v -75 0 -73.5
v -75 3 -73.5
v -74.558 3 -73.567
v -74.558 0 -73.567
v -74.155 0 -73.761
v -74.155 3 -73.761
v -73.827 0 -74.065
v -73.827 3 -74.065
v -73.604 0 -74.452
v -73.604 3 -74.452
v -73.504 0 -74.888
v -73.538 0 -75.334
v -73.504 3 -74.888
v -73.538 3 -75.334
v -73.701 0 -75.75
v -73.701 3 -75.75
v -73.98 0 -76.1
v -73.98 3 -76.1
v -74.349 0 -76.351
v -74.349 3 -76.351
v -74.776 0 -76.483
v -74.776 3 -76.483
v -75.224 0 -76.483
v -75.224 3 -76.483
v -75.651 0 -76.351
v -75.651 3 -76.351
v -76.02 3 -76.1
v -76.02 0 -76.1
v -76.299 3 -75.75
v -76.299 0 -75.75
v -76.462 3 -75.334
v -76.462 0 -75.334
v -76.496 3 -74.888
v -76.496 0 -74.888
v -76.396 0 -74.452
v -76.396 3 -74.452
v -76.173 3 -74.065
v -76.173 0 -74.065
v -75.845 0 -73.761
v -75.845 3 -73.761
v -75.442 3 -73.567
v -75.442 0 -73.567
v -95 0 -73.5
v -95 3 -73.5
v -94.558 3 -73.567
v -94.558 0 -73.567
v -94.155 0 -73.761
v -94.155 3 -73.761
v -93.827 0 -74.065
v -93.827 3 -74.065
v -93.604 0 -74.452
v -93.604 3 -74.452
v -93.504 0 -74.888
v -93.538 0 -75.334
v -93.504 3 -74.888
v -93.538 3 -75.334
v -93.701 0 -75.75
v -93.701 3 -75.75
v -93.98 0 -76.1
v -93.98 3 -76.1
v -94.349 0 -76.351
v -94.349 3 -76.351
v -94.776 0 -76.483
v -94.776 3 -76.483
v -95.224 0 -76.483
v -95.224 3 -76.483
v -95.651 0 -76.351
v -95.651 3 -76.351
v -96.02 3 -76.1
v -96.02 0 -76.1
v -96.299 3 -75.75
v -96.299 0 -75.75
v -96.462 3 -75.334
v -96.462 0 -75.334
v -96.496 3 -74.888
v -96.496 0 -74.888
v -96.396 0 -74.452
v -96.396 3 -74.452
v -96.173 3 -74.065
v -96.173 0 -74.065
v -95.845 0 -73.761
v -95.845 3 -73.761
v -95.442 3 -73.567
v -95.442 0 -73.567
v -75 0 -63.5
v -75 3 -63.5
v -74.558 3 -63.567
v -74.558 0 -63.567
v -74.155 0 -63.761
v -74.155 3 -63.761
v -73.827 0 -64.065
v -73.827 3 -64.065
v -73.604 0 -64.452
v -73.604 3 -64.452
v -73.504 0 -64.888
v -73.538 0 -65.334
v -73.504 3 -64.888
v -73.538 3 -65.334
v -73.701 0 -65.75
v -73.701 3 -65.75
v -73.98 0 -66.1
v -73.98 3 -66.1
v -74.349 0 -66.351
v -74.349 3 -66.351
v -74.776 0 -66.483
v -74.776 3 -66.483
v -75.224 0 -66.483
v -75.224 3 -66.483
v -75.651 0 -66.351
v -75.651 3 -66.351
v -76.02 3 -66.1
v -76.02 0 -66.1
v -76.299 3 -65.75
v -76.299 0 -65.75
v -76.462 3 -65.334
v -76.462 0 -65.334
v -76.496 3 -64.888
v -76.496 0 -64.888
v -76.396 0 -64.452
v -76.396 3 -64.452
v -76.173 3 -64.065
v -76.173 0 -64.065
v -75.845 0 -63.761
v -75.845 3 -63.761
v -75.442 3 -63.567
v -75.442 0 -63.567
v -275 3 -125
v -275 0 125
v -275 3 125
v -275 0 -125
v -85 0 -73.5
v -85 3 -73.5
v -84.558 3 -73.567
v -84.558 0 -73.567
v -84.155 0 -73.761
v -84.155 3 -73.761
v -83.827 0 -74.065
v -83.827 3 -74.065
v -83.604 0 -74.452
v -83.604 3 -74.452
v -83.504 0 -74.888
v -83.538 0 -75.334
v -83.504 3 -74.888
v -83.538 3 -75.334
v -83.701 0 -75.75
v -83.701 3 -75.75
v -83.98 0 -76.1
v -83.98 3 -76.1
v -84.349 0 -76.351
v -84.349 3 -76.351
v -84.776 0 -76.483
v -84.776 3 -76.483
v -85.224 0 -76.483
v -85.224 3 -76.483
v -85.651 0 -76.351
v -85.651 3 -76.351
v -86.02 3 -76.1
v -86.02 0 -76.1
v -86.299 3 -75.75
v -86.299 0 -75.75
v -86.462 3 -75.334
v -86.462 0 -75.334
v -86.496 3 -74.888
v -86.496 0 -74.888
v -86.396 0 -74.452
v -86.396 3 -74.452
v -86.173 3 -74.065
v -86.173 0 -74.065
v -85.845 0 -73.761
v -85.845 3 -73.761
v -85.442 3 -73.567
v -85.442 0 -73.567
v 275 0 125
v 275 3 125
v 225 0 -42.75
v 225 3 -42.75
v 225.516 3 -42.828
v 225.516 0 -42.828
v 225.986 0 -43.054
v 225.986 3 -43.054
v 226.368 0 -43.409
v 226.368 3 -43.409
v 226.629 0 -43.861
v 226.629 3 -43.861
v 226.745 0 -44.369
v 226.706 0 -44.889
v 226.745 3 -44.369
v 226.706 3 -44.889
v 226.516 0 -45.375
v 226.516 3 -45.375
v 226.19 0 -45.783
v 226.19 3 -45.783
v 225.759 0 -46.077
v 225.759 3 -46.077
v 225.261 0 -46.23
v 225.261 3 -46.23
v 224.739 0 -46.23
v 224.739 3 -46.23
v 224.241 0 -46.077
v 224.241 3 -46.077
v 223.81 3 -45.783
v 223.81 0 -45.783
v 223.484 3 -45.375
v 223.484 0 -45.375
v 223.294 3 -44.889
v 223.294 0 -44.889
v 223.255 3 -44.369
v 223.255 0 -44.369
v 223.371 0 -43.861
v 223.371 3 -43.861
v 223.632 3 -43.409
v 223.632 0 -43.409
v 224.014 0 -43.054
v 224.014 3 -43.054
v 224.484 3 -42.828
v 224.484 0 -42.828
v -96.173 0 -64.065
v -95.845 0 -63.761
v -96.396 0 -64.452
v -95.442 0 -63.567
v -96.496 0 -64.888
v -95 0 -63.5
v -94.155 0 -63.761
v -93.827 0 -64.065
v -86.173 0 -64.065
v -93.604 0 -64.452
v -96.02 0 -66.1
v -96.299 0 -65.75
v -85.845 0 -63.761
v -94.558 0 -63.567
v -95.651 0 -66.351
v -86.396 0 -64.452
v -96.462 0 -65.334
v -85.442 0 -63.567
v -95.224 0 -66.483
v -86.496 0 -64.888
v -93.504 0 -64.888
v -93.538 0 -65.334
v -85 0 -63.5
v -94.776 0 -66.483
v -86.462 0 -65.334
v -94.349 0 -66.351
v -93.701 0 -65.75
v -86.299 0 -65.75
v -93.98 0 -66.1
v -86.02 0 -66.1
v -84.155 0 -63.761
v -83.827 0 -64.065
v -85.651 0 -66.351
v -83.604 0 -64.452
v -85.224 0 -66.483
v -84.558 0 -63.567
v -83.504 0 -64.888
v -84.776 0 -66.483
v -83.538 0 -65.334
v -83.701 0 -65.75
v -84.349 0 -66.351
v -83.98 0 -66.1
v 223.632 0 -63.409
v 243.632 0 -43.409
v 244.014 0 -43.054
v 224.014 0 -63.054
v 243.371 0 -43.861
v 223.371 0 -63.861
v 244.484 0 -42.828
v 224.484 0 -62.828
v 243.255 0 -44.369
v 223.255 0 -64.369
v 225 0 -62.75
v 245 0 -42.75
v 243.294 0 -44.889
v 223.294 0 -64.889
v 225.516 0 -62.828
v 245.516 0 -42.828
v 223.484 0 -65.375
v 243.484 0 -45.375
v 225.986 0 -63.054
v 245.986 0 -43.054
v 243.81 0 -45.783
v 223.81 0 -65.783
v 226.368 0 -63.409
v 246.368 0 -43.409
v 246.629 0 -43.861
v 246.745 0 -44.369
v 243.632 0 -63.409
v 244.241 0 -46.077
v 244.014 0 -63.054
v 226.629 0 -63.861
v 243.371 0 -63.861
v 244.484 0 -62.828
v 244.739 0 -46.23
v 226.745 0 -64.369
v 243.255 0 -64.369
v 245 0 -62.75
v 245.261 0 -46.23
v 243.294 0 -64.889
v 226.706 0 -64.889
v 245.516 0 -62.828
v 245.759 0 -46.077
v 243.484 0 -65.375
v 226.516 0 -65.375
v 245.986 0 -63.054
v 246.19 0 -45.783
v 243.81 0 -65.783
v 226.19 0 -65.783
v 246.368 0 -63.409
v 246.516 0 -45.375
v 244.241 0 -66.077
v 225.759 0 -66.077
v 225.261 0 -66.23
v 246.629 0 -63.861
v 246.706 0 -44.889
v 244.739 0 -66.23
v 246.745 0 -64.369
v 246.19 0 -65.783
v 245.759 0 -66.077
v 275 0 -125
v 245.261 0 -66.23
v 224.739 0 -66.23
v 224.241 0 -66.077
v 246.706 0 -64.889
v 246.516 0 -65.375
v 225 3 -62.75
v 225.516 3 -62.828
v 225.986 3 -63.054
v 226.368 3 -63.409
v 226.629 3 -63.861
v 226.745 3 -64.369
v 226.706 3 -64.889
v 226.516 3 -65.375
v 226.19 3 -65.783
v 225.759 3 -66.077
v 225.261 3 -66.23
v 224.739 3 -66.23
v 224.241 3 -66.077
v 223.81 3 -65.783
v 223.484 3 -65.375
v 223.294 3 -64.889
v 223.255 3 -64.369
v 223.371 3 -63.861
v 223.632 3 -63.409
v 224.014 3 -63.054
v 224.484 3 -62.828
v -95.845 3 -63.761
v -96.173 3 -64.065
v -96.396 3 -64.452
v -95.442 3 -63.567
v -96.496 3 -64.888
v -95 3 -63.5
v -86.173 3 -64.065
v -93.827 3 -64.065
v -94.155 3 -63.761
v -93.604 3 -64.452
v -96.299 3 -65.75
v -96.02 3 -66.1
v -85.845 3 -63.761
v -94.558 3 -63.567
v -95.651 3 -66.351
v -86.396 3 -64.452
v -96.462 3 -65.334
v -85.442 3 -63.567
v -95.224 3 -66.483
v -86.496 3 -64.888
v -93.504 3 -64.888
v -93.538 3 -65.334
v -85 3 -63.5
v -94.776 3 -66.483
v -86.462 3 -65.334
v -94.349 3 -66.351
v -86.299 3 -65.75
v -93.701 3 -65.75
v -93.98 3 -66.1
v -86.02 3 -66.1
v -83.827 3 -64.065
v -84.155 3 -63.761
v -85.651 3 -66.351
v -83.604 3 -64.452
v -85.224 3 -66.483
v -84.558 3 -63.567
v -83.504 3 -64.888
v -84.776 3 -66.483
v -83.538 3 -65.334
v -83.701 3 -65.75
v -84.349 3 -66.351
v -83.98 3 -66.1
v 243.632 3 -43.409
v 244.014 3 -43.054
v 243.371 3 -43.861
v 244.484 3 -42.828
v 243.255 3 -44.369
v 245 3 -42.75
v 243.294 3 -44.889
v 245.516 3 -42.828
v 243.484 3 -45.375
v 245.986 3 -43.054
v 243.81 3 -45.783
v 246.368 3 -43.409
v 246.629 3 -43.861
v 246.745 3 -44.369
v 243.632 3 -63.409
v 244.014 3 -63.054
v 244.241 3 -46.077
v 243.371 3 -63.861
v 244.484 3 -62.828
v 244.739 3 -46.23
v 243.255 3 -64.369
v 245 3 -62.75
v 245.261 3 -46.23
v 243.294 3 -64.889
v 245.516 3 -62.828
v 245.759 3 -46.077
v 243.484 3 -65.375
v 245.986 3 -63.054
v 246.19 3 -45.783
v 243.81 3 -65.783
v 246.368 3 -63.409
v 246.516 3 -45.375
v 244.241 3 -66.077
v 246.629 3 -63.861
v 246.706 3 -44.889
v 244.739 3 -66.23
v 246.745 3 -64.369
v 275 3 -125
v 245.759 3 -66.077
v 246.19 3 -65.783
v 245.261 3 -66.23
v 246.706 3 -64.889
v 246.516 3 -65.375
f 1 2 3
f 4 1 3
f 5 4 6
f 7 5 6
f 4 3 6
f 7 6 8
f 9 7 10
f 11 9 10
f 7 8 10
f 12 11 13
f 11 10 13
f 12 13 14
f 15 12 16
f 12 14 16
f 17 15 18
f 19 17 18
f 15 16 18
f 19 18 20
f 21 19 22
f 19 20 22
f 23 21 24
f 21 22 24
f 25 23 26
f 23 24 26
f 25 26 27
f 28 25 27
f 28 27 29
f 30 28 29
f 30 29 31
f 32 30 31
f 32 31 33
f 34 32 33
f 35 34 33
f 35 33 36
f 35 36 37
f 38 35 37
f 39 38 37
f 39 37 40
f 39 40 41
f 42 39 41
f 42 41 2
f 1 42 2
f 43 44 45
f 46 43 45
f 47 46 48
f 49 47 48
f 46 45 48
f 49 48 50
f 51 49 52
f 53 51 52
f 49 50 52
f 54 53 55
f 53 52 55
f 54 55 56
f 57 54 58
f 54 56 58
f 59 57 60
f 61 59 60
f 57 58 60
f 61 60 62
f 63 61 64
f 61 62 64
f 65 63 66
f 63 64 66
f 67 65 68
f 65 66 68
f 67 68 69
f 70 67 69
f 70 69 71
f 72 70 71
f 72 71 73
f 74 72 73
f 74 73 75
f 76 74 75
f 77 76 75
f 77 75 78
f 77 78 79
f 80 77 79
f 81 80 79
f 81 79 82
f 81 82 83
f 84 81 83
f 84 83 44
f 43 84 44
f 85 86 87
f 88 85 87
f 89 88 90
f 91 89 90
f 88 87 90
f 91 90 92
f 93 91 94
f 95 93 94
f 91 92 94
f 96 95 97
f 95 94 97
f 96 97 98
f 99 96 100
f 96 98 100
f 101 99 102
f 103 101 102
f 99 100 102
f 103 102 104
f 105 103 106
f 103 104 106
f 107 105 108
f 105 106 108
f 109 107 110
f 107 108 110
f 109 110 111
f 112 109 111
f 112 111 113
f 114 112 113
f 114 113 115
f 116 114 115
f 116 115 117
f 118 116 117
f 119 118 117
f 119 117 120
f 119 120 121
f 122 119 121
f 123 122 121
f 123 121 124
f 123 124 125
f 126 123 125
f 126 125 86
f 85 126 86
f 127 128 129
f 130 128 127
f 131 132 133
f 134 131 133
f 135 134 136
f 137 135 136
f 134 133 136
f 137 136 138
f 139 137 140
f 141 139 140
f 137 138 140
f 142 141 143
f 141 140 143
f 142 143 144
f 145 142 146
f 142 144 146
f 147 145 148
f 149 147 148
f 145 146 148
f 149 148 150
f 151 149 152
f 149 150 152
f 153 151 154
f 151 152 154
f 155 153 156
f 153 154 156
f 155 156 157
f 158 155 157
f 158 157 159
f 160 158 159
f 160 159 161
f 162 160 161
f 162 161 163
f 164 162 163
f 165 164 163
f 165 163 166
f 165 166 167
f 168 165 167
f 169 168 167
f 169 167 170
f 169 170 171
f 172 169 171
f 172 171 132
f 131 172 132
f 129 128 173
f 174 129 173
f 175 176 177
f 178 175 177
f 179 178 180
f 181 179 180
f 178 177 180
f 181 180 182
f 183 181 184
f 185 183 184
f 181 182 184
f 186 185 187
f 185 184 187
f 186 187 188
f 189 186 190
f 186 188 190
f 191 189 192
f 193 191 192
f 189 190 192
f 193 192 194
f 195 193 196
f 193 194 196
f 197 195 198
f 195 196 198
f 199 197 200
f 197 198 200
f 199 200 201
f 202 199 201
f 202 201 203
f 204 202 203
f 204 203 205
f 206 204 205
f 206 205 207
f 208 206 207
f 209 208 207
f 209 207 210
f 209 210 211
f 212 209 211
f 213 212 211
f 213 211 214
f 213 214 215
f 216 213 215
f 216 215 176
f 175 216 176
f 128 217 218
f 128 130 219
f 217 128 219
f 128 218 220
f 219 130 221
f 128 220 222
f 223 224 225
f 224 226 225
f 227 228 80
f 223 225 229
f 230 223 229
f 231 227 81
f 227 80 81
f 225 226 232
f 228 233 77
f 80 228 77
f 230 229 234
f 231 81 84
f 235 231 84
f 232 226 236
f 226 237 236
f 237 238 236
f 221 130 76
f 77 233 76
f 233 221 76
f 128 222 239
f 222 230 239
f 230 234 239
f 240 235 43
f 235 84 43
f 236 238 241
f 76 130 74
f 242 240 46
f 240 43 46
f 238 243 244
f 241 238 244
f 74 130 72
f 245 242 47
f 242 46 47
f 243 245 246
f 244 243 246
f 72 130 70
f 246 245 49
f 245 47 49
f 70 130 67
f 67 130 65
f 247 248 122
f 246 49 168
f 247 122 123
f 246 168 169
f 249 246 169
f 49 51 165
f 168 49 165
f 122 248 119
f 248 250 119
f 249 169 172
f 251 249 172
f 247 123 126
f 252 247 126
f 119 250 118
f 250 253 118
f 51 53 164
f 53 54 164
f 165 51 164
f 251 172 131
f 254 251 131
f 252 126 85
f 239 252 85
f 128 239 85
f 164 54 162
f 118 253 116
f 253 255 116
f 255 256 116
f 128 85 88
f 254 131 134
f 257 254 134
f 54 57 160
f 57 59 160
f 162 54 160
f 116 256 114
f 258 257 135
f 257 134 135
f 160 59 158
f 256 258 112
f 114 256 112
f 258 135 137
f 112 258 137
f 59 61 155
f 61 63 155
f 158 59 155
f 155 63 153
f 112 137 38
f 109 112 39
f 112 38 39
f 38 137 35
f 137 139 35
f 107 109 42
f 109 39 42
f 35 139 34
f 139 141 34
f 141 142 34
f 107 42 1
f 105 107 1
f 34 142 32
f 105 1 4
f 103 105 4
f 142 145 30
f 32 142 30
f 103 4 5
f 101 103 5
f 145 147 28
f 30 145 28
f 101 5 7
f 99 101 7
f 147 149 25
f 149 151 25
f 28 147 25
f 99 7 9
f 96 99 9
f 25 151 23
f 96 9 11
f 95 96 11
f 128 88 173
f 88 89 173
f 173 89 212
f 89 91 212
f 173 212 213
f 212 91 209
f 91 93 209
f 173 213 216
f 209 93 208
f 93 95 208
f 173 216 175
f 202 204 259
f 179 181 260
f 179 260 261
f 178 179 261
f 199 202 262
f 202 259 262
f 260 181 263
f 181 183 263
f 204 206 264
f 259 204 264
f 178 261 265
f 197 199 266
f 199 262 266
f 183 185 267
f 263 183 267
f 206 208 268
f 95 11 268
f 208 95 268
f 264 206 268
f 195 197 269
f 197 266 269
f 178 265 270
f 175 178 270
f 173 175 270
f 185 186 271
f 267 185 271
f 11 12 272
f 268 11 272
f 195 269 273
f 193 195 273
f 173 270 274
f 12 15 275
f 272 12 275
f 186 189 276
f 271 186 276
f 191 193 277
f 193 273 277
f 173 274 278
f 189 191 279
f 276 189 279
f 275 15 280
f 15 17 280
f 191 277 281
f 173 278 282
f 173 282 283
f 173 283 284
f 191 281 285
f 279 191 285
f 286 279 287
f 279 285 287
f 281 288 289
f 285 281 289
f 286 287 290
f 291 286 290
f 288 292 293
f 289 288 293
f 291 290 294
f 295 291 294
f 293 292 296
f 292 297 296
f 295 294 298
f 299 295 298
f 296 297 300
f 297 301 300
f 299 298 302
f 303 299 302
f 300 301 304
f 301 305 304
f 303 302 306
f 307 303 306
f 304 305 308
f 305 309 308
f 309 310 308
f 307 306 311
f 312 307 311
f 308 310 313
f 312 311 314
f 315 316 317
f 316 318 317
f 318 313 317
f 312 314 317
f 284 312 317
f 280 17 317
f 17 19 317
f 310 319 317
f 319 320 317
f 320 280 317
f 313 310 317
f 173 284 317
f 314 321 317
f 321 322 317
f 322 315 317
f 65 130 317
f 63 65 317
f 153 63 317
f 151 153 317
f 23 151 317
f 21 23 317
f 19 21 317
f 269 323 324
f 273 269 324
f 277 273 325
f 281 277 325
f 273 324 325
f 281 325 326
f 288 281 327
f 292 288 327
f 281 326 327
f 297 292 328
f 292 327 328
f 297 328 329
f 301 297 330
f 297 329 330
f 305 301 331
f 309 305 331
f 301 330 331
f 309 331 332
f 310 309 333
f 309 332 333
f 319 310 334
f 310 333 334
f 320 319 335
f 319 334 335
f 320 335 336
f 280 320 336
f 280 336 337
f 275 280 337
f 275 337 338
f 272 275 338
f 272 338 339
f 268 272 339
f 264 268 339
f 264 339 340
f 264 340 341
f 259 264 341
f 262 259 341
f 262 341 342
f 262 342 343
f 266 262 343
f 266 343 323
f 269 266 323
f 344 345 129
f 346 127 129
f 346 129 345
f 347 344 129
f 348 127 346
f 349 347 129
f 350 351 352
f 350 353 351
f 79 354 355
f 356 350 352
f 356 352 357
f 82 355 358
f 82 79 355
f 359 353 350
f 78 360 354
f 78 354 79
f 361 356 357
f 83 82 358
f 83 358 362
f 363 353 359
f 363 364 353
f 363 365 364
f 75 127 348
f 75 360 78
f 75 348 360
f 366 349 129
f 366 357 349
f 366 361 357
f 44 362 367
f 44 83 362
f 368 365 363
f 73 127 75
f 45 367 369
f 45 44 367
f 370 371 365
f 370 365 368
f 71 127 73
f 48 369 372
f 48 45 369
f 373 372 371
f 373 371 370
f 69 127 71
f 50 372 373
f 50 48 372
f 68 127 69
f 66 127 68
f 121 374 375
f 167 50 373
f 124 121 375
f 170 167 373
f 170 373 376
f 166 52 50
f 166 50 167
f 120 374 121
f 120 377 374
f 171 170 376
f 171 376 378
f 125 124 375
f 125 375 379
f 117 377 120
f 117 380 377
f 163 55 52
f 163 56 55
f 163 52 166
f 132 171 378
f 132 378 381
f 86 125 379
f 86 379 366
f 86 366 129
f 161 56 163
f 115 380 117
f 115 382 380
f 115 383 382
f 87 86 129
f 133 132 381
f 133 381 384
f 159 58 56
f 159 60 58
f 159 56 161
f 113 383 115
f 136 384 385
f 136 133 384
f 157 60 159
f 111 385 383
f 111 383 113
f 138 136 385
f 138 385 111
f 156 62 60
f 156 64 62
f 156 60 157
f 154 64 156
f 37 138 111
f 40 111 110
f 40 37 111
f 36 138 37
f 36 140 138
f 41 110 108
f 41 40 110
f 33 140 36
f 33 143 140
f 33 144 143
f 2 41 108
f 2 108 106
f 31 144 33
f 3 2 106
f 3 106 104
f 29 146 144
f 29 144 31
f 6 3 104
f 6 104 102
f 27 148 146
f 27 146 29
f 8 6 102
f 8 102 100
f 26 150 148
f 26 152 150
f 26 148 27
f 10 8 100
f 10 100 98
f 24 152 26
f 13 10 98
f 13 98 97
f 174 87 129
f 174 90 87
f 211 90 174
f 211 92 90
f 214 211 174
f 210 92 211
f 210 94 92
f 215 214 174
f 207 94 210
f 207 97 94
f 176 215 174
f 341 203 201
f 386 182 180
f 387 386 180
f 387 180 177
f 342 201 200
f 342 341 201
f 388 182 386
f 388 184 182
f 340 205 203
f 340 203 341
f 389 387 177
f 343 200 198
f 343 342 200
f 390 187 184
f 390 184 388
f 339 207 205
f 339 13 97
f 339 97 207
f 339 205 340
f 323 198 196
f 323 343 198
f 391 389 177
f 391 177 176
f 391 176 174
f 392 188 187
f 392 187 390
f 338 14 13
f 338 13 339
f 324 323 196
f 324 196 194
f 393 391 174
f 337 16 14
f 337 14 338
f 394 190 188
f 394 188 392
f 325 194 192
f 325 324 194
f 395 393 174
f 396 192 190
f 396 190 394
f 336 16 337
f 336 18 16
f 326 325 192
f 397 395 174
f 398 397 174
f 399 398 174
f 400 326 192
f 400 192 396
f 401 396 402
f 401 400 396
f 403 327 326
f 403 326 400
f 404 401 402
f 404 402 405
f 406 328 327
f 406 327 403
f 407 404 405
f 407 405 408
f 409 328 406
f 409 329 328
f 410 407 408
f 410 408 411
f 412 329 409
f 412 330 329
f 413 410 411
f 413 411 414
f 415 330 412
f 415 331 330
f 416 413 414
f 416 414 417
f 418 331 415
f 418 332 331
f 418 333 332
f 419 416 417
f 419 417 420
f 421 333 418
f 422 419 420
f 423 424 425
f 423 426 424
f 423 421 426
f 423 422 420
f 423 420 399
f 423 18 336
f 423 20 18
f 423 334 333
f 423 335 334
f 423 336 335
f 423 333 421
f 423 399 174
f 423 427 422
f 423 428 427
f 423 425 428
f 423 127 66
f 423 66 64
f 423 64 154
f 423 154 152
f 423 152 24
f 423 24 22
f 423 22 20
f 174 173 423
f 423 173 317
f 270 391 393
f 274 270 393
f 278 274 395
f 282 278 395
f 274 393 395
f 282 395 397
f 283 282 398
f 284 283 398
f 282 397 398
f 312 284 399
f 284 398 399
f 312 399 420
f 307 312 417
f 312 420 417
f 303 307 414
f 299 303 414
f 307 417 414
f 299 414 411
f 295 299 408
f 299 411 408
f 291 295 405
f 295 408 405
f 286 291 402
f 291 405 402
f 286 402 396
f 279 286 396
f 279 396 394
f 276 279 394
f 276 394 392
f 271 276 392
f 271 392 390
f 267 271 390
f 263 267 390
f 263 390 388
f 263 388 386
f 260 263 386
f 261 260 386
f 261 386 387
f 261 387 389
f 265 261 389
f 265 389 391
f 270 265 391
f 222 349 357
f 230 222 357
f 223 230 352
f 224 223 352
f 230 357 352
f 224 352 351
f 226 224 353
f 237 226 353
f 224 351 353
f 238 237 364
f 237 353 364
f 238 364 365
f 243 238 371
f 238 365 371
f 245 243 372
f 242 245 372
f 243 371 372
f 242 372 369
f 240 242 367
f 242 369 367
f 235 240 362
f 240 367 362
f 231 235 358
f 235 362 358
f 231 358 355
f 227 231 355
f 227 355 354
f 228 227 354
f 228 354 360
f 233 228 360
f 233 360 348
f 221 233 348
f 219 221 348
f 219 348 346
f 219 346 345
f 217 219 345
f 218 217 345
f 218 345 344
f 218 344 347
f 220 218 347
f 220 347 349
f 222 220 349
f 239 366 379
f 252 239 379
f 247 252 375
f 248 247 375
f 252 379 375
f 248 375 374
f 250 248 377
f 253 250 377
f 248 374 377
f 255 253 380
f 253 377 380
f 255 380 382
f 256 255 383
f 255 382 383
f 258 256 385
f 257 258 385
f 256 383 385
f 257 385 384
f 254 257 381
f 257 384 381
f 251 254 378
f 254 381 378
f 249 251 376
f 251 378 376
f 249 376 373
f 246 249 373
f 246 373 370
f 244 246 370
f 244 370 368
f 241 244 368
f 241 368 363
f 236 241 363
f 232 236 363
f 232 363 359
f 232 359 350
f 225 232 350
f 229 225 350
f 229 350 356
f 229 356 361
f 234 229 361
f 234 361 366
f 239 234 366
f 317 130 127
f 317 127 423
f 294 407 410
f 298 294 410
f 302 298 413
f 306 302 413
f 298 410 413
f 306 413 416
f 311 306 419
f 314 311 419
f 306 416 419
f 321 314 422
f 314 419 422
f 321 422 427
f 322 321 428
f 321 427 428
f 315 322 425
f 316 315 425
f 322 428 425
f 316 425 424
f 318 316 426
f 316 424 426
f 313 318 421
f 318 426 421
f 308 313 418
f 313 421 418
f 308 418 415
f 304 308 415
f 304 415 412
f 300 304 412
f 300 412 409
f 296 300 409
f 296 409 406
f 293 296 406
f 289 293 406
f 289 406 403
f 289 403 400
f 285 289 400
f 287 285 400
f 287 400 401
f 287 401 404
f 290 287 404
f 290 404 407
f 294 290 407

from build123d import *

# Parameters (mm, degrees)
SKETCH1_W           = 550
SKETCH1_H           = 250
BOSS_EXTRUDE1_DEPTH = 3
SKETCH2_R           = 1.75
CUT_EXTRUDE1_DEPTH  = 10
SKETCH4_R           = 1.5
CUT_EXTRUDE3_DEPTH  = 20


with BuildPart() as part:
    # Sketch1 → Boss-Extrude1 (new body)
    with BuildSketch(Plane(origin=(0, 0, 0), x_dir=(1, 0, 0), z_dir=(0, 1, 0))):
        Rectangle(SKETCH1_W, SKETCH1_H)
    extrude(amount=BOSS_EXTRUDE1_DEPTH)

    # Sketch2 → Cut-Extrude1 (cut)
    with BuildSketch(Plane(origin=(0, 3, 0), x_dir=(1, 0, 0), z_dir=(0, 1, 0))):
        with Locations((225, 64.5)):
            Circle(SKETCH2_R)
        with Locations((245, 64.5)):
            Circle(SKETCH2_R)
        with Locations((225, 44.5)):
            Circle(SKETCH2_R)
        with Locations((245, 44.5)):
            Circle(SKETCH2_R)
    extrude(amount=-CUT_EXTRUDE1_DEPTH, mode=Mode.SUBTRACT)

    # Sketch4 → Cut-Extrude3 (cut)
    with BuildSketch(Plane(origin=(0, 3, 0), x_dir=(1, 0, 0), z_dir=(0, 1, 0))):
        with Locations((-95, 65)):
            Circle(SKETCH4_R)
        with Locations((-85, 65)):
            Circle(SKETCH4_R)
        with Locations((-75, 65)):
            Circle(SKETCH4_R)
        with Locations((-85, 75)):
            Circle(SKETCH4_R)
        with Locations((-75, 75)):
            Circle(SKETCH4_R)
        with Locations((-95, 75)):
            Circle(SKETCH4_R)
    extrude(amount=-CUT_EXTRUDE3_DEPTH, mode=Mode.SUBTRACT)


solid = part.part
